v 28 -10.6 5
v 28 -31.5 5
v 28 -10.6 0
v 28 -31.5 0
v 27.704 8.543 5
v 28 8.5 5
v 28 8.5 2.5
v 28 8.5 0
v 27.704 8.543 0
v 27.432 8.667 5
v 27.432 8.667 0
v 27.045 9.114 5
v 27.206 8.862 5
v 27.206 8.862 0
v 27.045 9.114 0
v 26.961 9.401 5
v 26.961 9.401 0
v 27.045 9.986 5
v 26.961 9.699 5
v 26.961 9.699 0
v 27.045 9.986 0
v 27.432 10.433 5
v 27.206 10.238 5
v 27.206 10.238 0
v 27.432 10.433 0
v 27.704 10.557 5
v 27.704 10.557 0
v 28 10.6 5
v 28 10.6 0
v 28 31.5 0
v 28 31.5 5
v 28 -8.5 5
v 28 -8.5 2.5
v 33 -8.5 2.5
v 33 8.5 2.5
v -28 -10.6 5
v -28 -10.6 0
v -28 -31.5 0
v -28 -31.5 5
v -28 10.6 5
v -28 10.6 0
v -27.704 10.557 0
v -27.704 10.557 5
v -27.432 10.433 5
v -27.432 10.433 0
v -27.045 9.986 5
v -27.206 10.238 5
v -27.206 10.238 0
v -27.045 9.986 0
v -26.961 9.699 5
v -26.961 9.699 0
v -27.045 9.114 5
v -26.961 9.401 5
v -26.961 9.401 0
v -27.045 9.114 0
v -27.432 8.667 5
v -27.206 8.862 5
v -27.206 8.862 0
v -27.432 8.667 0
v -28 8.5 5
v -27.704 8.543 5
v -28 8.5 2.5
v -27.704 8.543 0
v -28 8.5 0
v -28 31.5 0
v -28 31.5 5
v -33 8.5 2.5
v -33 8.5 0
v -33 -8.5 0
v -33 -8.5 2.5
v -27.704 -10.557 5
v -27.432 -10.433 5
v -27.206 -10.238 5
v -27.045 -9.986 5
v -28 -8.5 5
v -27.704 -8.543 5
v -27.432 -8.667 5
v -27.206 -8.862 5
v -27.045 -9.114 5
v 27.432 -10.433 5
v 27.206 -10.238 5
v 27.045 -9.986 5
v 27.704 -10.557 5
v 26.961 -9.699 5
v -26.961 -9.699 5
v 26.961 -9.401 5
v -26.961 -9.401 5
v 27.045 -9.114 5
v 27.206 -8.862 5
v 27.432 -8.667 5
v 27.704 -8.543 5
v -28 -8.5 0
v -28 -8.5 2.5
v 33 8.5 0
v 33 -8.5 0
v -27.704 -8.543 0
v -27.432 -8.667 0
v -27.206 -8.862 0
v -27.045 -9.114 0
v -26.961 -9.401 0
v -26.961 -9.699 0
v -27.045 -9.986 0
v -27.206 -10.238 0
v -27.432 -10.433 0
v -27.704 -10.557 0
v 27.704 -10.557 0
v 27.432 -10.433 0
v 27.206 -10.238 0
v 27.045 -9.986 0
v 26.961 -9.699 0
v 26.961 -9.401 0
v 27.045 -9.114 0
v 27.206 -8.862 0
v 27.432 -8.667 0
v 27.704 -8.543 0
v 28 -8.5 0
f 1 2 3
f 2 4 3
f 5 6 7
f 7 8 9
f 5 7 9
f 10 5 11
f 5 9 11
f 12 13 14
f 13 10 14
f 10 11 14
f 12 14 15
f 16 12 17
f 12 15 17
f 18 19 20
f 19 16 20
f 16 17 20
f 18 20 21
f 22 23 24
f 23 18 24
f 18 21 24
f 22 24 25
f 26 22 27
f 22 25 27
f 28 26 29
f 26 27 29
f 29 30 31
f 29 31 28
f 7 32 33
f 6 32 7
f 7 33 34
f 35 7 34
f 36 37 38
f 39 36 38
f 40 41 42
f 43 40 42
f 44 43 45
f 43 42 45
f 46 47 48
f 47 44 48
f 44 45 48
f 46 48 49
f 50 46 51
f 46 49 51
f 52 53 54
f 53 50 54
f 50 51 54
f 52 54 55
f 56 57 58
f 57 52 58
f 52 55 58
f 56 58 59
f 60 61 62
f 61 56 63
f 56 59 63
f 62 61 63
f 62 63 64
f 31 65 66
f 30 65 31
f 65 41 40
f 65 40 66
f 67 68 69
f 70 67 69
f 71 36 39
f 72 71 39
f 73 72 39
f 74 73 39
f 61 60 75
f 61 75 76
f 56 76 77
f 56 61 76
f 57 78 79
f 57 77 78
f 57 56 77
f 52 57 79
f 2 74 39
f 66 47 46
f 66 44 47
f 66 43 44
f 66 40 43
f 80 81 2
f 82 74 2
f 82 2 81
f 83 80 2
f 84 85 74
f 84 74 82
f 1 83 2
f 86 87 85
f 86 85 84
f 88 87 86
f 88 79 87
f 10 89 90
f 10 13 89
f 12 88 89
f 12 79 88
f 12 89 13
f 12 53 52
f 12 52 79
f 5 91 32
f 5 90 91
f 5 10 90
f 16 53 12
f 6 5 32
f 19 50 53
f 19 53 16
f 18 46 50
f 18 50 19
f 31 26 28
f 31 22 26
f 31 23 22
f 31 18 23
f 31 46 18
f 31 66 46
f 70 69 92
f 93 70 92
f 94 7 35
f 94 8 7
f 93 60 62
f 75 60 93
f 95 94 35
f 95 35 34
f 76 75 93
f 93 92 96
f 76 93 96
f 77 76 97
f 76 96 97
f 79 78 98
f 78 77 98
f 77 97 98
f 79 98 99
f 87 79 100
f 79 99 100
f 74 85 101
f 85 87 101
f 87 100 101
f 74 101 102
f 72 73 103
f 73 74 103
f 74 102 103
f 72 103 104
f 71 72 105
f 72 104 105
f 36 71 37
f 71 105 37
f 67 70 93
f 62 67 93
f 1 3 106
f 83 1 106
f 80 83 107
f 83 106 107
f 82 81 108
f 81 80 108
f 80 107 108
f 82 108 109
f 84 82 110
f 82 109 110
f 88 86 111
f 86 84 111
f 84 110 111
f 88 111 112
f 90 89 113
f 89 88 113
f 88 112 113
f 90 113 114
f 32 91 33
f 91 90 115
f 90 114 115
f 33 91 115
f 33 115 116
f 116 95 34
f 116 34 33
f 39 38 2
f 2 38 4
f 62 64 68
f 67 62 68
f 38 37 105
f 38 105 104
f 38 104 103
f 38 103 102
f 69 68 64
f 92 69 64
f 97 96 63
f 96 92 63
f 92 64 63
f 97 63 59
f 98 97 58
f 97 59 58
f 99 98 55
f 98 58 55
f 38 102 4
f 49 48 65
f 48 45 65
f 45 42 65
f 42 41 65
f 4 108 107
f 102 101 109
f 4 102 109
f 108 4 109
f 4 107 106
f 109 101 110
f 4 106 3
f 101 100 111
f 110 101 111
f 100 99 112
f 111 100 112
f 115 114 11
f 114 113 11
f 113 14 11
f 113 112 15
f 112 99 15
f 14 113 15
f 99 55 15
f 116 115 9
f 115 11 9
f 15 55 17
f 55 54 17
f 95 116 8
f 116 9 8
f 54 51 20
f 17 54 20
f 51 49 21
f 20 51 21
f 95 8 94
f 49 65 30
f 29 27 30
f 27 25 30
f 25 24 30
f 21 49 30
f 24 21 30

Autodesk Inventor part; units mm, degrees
ref_plane "YZ Plane" through (0, 0, 0) normal (1, 0, 0) x (0, 1, 0)
ref_plane "XZ Plane" through (0, 0, 0) normal (0, 1, 0) x (-1, 0, 0)
ref_plane "XY Plane" through (0, 0, 0) normal (0, 0, 1) x (1, 0, 0)
sketch "スケッチ1" plane through (0, 0, 0) normal (0, 0, 1) x (1, 0, 0)
  line L0 (-28, -31.5) -> (28, -31.5) construction
  line L1 (28, -31.5) -> (28, 31.5) construction
  line L2 (28, 31.5) -> (-28, 31.5) construction
  line L3 (-28, 31.5) -> (-28, -31.5) construction
  line L4 (-28, -31.5) -> (28, 31.5) construction
  line L5 (28, -31.5) -> (-28, 31.5) construction
  line L6 (-28, 10.6) -> (-28, 31.5)
  line L7 (-28, 31.5) -> (28, 31.5)
  line L8 (28, 31.5) -> (28, 10.6)
  line L9 (-28, -10.6) -> (-28, -31.5)
  line L10 (-28, -31.5) -> (28, -31.5)
  line L11 (28, -31.5) -> (28, -10.6)
  line L12 (-28, 8.5) -> (-33, 8.5)
  line L13 (-33, 8.5) -> (-33, -8.5)
  line L14 (-33, -8.5) -> (-28, -8.5)
  line L15 (28, 8.5) -> (33, 8.5)
  line L16 (33, 8.5) -> (33, -8.5)
  line L17 (33, -8.5) -> (28, -8.5)
  line L18 (0, 0) -> (0, 31.5) construction
  line L19 (0, 0) -> (28, 0) construction
  arc A0 (-28, 8.5) -> (-28, 10.6) centre (-28, 9.55) ccw
  arc A1 (-28, -10.6) -> (-28, -8.5) centre (-28, -9.55) ccw
  arc A2 (28, 10.6) -> (28, 8.5) centre (28, 9.55) ccw
  arc A3 (28, -8.5) -> (28, -10.6) centre (28, -9.55) ccw
  dimension "d45" = 63
  dimension "d73" = 56
  dimension "d74" = 1.05
  dimension "d75" = 5
  dimension "d76" = 23
extrude "押し出し1" add sketch "スケッチ1" along normal blind 5
sketch "スケッチ2" plane through (0, 0, 5) normal (0, 0, 1) x (1, 0, 0)
  line L0 (-28, 31.5) -> (-28, 10.6) projected
  line L1 (28, 10.6) -> (28, 31.5) projected
  line L2 (-50.9845, 57.5344) -> (-28, 57.5344)
  line L3 (-28, 57.5344) -> (-28, -57.37)
  line L4 (-28, -57.37) -> (-50.9845, -57.37)
  line L5 (-50.9845, -57.37) -> (-50.9845, 57.5344)
  line L6 (28, 64.7229) -> (65.0267, 64.7229)
  line L7 (65.0267, 64.7229) -> (65.0267, -57.37)
  line L8 (65.0267, -57.37) -> (28, -57.37)
  line L9 (28, -57.37) -> (28, 64.7229)
  point P0 (0, 0)
extrude "押し出し2" cut sketch "スケッチ2" against normal blind 2.5
equation "\"d45\" = d1"
equation "\"d76\" = d20 + d23"
equation "\"d1\" = 63"
equation "\"d20\" = 8"
equation "\"d23\" = 15"
properties part number "コックピット_2_サブフレーム_4" material "アセタール樹脂、黒"
